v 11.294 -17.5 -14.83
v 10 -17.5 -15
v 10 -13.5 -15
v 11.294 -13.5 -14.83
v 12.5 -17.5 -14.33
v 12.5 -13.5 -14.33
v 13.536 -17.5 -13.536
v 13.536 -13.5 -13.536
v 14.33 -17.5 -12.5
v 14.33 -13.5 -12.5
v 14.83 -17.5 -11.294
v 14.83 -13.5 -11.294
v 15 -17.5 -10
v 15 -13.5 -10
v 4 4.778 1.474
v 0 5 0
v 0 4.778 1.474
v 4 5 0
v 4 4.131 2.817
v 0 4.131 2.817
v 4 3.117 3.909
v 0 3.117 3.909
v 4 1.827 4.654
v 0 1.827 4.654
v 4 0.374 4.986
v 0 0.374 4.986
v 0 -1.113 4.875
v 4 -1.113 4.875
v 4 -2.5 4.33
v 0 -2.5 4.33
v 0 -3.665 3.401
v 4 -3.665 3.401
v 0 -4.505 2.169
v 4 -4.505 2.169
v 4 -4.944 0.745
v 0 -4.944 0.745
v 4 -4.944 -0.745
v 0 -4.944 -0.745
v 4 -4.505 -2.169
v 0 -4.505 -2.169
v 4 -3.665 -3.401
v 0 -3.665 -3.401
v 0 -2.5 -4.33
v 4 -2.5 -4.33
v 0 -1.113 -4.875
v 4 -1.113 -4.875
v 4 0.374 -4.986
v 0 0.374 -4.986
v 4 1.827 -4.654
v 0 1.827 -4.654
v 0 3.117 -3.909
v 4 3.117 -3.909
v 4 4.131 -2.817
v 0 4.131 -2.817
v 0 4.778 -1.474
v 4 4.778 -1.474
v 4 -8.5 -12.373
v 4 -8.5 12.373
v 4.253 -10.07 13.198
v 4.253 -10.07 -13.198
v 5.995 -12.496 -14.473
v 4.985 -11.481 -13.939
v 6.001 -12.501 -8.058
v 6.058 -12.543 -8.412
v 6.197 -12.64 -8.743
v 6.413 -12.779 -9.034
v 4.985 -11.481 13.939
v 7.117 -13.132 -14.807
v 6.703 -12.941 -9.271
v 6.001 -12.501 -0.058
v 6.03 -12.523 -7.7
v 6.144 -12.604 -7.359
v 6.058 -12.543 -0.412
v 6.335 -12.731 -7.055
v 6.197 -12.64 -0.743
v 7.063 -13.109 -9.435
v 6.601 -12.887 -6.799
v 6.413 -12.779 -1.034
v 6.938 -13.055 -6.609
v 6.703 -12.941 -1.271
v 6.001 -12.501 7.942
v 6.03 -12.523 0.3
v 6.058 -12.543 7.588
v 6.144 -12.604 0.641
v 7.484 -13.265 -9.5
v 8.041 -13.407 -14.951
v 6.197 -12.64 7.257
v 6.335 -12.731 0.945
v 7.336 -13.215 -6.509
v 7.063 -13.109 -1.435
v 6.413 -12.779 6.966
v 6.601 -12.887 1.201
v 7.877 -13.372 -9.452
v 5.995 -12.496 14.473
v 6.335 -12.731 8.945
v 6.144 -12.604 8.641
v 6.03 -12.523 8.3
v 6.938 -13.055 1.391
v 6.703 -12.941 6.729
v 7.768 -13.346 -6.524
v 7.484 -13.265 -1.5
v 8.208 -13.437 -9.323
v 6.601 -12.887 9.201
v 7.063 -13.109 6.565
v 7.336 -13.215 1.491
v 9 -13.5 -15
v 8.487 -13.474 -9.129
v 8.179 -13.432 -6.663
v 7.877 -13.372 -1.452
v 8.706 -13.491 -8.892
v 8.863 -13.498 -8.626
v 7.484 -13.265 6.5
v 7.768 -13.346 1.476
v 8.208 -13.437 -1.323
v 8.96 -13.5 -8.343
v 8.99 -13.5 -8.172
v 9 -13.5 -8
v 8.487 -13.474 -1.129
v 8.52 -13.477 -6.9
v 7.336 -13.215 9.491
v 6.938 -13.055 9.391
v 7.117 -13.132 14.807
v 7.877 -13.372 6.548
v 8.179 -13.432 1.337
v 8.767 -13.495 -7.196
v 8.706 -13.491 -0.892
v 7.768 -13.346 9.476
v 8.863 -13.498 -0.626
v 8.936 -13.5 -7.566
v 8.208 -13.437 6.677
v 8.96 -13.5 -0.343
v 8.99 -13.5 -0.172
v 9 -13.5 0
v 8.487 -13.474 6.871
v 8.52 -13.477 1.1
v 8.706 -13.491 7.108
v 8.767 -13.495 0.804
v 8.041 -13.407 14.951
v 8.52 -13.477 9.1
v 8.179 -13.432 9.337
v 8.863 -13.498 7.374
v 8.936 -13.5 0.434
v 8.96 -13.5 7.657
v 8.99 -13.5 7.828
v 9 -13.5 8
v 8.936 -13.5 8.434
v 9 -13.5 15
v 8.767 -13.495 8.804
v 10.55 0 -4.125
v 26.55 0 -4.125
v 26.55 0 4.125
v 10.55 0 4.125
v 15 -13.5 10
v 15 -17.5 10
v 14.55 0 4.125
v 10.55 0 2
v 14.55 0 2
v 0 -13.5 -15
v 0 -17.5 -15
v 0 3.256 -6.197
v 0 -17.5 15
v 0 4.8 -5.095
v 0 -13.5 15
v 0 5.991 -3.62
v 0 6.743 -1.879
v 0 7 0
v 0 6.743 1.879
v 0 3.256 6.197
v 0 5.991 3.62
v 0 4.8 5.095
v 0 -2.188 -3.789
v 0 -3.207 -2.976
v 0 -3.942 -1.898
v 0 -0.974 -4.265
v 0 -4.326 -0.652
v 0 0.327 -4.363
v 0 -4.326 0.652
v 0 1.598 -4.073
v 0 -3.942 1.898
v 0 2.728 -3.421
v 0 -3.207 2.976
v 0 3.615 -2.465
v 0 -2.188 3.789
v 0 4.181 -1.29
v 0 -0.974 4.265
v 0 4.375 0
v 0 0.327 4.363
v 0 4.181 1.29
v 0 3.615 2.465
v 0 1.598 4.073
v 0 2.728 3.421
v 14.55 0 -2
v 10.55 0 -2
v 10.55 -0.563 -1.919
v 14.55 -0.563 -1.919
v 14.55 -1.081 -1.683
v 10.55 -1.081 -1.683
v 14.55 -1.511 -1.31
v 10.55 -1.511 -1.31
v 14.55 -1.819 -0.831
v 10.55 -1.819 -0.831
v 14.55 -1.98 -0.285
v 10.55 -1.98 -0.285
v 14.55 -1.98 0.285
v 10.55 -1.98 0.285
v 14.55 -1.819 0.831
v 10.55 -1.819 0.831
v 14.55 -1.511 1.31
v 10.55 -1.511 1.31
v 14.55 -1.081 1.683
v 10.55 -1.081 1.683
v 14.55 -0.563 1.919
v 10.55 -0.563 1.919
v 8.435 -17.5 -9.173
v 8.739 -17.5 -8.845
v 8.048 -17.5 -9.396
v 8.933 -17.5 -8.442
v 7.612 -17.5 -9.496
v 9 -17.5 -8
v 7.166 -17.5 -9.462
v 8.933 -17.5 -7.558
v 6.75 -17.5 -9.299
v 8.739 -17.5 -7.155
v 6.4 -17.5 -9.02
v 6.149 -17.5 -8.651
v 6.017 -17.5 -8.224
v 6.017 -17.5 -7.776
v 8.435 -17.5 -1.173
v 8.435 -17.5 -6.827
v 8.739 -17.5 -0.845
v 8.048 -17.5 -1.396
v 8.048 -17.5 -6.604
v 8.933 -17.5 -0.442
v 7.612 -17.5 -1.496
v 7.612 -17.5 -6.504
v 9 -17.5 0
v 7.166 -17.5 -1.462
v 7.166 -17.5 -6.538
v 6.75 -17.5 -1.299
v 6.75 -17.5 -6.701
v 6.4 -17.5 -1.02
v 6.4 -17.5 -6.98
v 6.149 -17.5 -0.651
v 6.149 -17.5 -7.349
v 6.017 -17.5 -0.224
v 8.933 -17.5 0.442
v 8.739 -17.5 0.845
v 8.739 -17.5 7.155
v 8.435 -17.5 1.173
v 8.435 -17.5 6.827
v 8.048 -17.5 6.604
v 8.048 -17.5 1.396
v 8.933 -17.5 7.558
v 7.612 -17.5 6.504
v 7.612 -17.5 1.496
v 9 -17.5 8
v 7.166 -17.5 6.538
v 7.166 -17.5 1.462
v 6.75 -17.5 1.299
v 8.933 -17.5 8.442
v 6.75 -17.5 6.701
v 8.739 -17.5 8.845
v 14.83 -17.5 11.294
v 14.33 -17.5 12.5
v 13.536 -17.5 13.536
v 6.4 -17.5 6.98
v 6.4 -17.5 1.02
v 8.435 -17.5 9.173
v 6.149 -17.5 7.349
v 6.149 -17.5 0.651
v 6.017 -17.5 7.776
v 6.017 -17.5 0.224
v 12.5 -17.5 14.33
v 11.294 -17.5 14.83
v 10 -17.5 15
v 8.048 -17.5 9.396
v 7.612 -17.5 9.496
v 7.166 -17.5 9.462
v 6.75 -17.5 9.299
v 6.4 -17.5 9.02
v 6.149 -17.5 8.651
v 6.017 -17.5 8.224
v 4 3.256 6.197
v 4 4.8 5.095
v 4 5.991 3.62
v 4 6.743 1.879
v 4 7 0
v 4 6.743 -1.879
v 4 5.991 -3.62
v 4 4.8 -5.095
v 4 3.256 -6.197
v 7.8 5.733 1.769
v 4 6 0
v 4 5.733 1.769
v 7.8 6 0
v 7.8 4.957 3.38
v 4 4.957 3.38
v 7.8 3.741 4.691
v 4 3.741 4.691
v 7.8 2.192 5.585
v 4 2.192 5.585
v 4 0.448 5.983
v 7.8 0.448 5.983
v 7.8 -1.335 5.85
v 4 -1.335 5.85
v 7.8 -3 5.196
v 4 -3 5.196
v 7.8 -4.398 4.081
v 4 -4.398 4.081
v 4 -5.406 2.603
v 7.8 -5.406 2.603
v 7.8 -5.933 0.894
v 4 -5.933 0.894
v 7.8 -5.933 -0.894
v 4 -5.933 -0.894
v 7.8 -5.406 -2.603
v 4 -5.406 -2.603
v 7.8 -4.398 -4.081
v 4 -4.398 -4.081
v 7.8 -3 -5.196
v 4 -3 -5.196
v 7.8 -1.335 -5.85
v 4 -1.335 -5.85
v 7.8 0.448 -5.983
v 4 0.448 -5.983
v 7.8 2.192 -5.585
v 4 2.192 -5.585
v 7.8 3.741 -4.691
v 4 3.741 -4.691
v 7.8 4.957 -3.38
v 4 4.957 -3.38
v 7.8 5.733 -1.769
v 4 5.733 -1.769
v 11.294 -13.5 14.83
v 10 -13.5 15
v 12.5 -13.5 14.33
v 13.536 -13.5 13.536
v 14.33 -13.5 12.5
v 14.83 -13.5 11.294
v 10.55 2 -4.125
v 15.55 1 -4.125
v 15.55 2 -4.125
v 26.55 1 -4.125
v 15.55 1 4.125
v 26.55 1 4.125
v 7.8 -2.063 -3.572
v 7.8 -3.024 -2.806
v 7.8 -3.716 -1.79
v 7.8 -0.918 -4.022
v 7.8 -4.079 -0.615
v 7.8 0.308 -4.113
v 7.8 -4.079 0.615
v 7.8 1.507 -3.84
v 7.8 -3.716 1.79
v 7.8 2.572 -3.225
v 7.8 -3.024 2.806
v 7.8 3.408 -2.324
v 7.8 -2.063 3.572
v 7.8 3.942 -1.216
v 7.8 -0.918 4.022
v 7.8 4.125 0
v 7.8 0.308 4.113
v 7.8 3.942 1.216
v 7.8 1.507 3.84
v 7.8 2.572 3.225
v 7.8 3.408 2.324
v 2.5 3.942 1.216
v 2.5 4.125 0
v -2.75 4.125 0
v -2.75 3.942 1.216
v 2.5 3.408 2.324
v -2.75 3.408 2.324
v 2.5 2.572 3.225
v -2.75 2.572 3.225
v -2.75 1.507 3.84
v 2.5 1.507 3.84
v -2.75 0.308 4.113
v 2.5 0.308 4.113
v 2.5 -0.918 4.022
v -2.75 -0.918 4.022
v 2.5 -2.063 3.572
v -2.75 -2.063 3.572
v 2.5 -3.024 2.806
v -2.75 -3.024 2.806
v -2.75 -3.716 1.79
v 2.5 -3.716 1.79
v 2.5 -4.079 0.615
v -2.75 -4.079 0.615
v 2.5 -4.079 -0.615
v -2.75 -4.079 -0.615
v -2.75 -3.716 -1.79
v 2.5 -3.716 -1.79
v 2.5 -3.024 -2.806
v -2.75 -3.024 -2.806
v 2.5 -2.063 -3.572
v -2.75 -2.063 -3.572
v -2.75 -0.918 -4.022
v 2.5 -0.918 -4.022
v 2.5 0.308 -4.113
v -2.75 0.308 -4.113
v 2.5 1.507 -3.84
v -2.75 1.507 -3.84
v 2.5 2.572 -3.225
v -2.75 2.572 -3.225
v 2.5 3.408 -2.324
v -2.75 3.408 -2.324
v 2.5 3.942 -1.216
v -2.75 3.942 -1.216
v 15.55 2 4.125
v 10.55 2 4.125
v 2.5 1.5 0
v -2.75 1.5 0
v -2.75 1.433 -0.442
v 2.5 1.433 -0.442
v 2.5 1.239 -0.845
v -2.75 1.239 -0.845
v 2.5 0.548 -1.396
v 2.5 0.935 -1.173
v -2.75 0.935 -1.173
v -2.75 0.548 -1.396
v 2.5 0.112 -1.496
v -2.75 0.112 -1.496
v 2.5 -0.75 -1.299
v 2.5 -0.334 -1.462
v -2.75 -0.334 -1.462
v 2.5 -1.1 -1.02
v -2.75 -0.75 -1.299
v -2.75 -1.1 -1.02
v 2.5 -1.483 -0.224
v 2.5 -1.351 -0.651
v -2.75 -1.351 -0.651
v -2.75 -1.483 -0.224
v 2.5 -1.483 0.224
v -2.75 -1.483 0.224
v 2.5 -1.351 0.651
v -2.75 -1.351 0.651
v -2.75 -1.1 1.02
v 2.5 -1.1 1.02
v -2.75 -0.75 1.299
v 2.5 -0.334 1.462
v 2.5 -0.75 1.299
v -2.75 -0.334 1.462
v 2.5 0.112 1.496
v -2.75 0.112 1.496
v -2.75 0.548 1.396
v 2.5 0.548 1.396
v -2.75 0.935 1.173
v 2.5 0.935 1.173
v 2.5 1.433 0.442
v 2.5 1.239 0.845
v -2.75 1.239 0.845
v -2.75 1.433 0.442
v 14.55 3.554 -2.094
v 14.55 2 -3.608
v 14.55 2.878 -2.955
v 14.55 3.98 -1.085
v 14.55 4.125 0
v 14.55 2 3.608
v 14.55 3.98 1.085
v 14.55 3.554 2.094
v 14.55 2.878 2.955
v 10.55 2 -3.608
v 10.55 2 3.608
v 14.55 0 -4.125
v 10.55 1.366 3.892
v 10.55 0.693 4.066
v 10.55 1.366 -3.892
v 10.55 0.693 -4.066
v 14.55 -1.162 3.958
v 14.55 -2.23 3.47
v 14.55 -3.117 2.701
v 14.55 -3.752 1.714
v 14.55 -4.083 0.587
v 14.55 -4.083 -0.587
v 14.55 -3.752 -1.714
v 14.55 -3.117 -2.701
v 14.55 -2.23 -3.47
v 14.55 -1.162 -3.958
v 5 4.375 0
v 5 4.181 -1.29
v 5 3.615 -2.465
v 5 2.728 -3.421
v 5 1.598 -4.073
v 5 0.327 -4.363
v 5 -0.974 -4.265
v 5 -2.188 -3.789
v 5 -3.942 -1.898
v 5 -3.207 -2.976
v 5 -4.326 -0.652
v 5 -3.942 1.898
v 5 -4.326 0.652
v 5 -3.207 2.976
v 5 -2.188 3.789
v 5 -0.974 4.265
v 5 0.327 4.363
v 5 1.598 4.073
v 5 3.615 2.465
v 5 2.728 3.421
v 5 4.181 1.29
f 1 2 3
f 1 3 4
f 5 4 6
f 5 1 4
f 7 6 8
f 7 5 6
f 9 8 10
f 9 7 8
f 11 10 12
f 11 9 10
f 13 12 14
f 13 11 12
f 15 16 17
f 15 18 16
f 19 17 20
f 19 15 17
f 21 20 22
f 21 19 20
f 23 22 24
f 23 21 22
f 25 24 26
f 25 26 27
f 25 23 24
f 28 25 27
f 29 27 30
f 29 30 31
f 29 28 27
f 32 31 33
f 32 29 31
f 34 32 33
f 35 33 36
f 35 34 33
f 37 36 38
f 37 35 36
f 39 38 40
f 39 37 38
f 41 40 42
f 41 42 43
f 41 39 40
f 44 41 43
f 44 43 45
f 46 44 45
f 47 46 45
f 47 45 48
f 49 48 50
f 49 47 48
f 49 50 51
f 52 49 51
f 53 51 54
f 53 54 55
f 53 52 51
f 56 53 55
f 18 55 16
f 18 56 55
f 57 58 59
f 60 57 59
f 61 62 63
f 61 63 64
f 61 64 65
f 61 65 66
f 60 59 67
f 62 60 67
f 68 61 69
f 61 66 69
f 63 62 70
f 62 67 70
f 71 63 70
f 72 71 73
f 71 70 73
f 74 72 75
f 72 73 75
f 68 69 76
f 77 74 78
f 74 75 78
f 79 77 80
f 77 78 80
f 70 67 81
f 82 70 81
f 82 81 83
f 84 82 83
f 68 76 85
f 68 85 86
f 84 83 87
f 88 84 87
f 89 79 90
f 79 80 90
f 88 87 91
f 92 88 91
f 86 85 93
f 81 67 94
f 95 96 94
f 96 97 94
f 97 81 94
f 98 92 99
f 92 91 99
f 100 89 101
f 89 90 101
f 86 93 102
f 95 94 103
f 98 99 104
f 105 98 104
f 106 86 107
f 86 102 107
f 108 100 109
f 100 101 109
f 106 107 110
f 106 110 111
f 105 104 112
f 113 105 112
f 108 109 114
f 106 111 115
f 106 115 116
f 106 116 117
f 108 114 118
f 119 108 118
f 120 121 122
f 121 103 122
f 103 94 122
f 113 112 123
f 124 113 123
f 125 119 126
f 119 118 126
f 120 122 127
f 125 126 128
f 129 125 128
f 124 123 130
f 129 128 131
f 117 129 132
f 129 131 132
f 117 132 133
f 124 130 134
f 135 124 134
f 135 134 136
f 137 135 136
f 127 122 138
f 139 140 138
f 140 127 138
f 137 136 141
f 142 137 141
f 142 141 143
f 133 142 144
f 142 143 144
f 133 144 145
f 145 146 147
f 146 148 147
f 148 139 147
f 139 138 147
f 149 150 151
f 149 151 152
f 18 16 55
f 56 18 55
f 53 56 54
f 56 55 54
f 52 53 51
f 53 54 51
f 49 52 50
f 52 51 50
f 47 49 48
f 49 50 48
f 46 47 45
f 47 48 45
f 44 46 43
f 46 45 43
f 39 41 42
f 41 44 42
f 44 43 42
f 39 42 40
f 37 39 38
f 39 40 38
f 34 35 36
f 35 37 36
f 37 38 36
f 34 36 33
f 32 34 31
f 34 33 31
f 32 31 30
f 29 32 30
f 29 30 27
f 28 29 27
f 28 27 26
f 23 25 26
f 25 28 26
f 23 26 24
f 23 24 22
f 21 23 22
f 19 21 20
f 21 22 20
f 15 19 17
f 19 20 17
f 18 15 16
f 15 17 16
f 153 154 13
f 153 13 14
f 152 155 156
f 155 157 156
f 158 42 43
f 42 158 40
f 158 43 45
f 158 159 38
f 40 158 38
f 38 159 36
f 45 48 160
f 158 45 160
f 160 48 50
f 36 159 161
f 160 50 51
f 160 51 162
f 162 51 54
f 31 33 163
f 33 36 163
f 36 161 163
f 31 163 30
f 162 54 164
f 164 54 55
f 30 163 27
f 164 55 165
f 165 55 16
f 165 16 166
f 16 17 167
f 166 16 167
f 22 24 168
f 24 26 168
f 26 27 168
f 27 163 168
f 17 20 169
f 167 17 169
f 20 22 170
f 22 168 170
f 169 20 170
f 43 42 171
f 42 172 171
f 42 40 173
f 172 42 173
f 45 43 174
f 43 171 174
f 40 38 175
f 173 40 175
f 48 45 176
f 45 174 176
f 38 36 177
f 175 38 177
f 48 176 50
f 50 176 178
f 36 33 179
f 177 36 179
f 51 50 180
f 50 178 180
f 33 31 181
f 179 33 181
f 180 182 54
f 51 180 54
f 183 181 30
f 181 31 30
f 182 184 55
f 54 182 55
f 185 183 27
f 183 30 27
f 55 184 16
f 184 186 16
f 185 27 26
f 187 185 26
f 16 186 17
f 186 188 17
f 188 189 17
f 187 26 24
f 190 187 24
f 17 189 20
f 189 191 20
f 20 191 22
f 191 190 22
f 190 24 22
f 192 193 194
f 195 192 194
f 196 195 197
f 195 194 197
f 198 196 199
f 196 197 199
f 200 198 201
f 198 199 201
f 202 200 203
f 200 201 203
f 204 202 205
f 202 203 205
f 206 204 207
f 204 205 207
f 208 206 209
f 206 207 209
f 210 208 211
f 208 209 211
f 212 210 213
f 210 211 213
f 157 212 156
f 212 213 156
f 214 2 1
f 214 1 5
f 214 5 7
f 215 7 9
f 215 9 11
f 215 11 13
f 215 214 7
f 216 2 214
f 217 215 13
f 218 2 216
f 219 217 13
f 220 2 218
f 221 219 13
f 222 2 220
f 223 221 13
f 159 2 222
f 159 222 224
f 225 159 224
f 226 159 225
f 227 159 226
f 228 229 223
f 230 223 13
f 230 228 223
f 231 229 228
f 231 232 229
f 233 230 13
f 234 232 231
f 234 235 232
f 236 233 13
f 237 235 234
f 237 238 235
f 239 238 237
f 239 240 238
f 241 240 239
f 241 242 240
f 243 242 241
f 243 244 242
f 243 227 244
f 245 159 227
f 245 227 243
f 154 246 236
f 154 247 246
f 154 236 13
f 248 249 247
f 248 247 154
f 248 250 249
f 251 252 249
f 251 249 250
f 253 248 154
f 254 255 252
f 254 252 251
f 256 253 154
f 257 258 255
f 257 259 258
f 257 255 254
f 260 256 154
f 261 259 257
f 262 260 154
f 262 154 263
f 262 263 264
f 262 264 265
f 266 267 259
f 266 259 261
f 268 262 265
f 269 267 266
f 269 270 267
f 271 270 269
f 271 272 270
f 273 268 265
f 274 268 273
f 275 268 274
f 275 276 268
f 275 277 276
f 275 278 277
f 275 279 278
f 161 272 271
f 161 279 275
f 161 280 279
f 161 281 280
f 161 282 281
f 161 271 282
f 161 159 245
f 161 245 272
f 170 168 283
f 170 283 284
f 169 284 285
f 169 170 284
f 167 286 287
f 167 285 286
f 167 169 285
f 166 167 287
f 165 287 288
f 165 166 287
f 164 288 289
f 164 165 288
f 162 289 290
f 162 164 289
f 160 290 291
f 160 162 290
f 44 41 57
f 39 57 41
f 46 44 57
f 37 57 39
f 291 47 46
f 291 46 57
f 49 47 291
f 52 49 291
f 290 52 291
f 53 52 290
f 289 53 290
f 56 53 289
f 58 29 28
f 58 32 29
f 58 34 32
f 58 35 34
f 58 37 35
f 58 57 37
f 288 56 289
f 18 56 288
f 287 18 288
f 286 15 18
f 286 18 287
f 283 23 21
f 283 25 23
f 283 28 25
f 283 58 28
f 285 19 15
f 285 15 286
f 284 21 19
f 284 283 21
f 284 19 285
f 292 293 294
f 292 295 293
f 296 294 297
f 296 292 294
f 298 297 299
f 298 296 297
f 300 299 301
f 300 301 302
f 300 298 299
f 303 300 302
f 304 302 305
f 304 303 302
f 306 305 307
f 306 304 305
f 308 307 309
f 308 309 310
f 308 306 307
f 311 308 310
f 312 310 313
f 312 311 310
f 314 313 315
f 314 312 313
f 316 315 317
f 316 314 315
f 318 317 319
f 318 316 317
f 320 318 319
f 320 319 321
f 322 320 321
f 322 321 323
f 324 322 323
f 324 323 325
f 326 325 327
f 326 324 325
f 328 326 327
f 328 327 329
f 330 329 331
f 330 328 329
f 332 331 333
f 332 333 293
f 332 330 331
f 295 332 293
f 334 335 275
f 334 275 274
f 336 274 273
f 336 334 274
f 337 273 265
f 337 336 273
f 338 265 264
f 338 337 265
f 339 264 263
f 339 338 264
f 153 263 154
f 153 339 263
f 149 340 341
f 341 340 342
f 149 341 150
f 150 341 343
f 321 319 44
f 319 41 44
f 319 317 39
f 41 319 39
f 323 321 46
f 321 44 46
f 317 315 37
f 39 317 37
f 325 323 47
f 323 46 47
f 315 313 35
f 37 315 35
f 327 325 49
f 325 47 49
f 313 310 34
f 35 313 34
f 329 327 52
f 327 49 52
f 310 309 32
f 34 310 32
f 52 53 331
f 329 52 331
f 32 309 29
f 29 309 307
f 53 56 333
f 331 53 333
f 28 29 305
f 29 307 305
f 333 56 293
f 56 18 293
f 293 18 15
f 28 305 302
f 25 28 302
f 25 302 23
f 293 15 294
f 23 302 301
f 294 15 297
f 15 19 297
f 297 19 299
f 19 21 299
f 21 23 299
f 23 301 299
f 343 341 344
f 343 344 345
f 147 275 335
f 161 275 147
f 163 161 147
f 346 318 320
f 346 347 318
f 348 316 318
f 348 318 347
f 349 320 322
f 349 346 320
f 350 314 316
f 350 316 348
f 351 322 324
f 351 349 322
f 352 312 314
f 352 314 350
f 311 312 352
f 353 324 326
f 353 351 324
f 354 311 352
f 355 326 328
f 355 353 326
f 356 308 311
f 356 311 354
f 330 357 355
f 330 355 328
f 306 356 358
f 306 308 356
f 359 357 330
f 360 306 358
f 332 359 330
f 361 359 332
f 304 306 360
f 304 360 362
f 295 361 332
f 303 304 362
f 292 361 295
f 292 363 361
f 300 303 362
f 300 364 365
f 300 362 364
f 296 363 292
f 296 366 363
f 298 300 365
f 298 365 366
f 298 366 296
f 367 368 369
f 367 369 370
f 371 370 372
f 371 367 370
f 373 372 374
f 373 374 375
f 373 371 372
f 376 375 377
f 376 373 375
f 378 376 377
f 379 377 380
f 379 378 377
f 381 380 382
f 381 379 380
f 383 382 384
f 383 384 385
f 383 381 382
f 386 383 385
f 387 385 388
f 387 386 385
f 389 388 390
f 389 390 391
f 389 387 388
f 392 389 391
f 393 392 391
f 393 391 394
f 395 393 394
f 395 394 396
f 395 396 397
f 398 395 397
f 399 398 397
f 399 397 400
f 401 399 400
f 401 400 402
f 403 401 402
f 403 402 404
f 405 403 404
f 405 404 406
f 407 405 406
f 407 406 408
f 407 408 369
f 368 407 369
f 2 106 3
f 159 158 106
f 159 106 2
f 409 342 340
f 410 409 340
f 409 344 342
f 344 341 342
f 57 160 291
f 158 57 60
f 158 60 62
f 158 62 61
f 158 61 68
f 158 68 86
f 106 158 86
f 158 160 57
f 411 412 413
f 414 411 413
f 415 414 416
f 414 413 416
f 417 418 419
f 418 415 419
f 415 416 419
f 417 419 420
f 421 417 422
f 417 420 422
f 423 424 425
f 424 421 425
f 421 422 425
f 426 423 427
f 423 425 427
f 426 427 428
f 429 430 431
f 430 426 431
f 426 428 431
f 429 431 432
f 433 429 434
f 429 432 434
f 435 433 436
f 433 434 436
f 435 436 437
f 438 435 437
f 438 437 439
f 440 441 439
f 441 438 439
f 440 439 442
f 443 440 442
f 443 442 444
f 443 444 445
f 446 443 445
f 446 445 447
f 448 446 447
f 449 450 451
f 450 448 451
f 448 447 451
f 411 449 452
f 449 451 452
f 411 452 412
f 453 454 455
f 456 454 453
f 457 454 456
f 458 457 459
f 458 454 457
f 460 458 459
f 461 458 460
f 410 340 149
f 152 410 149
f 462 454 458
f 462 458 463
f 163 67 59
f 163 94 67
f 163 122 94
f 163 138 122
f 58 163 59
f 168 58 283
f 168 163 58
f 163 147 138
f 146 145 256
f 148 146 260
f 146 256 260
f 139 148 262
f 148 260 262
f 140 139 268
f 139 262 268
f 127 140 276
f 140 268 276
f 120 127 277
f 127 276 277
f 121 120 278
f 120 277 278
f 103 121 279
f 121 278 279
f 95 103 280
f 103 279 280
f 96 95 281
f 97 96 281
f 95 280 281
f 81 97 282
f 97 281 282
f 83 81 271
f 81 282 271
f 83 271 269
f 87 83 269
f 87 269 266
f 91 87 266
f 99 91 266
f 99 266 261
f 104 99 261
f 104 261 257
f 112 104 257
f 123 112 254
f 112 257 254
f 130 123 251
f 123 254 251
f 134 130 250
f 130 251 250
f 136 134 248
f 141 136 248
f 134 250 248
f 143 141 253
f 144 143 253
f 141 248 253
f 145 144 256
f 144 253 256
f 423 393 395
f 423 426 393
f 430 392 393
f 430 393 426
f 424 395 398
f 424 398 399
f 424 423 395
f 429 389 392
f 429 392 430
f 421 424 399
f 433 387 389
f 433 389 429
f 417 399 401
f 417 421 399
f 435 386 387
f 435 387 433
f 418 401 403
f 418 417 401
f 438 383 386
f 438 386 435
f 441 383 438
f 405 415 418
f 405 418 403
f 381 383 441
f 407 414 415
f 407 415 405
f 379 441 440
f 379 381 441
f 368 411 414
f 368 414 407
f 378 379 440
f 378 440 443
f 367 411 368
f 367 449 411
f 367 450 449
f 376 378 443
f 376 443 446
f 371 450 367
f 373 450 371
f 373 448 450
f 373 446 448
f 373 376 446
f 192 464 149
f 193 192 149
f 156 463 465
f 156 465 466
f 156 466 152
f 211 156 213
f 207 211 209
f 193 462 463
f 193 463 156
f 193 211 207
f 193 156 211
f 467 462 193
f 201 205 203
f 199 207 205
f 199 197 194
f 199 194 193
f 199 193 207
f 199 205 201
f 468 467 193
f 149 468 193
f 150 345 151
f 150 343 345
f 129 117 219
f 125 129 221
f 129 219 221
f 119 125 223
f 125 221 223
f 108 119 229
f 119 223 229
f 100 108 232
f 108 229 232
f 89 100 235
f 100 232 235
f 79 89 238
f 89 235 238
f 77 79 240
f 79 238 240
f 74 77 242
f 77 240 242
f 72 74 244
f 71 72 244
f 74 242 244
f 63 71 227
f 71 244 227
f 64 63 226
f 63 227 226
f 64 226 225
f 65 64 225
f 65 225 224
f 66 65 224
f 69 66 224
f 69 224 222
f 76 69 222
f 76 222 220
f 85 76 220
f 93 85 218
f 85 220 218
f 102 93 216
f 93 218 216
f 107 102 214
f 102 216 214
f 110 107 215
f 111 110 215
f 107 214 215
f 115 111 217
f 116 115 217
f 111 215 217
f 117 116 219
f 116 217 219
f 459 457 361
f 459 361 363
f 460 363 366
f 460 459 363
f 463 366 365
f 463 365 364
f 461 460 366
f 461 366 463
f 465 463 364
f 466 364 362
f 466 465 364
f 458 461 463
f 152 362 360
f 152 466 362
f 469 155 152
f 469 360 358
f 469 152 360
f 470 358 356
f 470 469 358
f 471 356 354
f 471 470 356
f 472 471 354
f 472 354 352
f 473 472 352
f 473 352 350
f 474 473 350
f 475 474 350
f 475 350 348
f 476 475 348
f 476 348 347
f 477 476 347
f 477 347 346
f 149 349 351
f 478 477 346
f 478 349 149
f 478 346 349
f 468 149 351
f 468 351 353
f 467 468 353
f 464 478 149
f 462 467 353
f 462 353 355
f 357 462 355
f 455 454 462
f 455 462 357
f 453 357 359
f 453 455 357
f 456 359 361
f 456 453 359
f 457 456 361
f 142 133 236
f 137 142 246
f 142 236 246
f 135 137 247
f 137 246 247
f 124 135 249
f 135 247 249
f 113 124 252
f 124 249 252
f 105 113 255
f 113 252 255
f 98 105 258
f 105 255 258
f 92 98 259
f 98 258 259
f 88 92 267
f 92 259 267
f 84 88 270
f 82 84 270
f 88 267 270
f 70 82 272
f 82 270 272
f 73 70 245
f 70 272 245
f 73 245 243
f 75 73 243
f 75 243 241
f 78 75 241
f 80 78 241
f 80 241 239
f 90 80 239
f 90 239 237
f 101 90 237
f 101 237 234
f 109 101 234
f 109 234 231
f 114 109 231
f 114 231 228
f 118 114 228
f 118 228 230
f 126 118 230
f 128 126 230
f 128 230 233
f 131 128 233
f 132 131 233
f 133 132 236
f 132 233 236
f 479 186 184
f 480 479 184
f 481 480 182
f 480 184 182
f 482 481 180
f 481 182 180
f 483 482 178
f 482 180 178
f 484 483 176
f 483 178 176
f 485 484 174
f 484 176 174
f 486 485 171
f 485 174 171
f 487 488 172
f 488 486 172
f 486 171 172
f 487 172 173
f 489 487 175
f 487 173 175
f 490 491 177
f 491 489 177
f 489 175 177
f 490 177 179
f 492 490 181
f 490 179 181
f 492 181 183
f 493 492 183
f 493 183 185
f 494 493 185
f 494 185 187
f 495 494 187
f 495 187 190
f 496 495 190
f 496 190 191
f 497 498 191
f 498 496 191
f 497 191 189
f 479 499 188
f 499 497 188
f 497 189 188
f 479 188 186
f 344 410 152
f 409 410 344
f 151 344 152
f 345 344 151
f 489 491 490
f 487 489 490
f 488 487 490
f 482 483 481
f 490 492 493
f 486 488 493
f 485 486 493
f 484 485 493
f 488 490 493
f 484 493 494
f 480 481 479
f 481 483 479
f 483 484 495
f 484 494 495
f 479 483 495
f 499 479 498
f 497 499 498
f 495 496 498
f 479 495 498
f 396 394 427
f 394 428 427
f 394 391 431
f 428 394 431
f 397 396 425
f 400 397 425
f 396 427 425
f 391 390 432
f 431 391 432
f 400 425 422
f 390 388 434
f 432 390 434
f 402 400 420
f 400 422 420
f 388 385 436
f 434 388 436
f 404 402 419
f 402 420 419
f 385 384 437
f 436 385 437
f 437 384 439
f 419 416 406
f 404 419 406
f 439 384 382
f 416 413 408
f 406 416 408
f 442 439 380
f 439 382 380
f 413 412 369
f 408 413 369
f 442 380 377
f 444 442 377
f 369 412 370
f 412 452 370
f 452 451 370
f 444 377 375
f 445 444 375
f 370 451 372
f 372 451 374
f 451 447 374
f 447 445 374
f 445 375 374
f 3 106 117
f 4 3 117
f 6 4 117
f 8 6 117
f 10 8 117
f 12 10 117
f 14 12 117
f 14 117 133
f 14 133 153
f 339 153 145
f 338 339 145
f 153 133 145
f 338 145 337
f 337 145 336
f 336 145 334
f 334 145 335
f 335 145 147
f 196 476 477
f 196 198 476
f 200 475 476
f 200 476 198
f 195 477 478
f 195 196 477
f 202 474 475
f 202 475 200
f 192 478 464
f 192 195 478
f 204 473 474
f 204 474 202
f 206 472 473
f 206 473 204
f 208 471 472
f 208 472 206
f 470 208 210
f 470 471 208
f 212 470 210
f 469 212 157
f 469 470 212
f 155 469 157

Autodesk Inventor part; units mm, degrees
ref_plane "YZ Plane" through (0, 0, 0) normal (1, 0, 0) x (0, 1, 0)
ref_plane "XZ Plane" through (0, 0, 0) normal (0, 1, 0) x (-1, 0, 0)
ref_plane "XY Plane" through (0, 0, 0) normal (0, 0, 1) x (1, 0, 0)
sketch "Sketch1" plane through (0, 0, 0) normal (0, 0, 1) x (1, 0, 0)
  line L0 (0, 5) -> (4, 5)
  line L1 (4, 5) -> (4, 6)
  line L2 (4, 6) -> (7.8, 6)
  line L3 (7.8, 6) -> (7.8, 4.125)
  line L4 (7.8, 4.125) -> (14.55, 4.125)
  line L5 (14.55, 4.125) -> (14.55, 0)
  line L6 (14.55, 0) -> (5, 0)
  line L7 (5, 0) -> (5, 4.375)
  line L8 (5, 4.375) -> (0, 4.375)
  line L9 (0, 4.375) -> (0, 5)
  line L10 (-2.75, 4.125) -> (2.5, 4.125)
  line L11 (2.5, 4.125) -> (2.5, 1.5)
  line L12 (2.5, 1.5) -> (-2.75, 1.5)
  line L13 (-2.75, 1.5) -> (-2.75, 4.125)
  line L14 (10.55, 0) -> (15.55, 0)
  line L15 (15.55, 0) -> (15.55, 2)
  line L16 (15.55, 2) -> (10.55, 2)
  line L17 (10.55, 2) -> (10.55, 0)
  line L18 (15.55, 1) -> (26.55, 1)
  line L19 (26.55, 1) -> (26.55, 0)
  line L20 (26.55, 0) -> (15.55, 0)
  line L21 (15.55, 0) -> (15.55, 1)
  line L22 (-8.61, 0) -> (32.41, 0) projected
  point P0 (0, 0)
  point P1 (2.5, 4.375)
  point P2 (14.55, 2)
  point P3 (14.55, 0)
  dimension "d0" = 6
  dimension "d1" = 5
  dimension "d2" = 1.5
  dimension "d3" = 0.25
  dimension "d5" = 2.75
  dimension "d6" = 5
  dimension "d7" = 4.125
  dimension "d8" = 4
  dimension "d9" = 3.8
  dimension "d10" = 6.75
  dimension "d11" = 4
  dimension "d12" = 2
  dimension "d13" = 5
  dimension "d14" = 11
  dimension "d15" = 4.125
revolve "Revolution1" add sketch "Sketch1" angle 360 about axis through (-10, 0, 0) along (1, 0, 0) contours L0 L1 L2 L3 L4 L5 L16 L17 L6 L7 L8 L9
revolve "Revolution2" add sketch "Sketch1" angle 360 about axis through (-10, 0, 0) along (1, 0, 0) separate body contours L10 L11 L12 L13
extrude "Extrusion1" cut sketch "Sketch1" along normal through all both and the other way through all contours L17 L16 L5 L6
extrude "Extrusion2" add sketch "Sketch1" along normal mid plane 8.25 separate body contours L17 L16 L5 L6 | L5 L16 L15 L14 | L15 L18 L19 L20
sketch "Sketch2" plane through (0, 0, 0) normal (1, 0, 0) x (0, 1, 0)
  circle A0 centre (0, 0) radius 5
  arc A1 (3.2557, -6.1968) -> (3.2557, 6.1968) centre (0, 0) ccw
  line L0 (3.2557, -6.1968) -> (-13.5, -15)
  line L1 (-13.5, -15) -> (-17.5, -15)
  line L2 (-17.5, -15) -> (-17.5, 15)
  line L3 (-17.5, 15) -> (-13.5, 15)
  line L4 (-13.5, 15) -> (3.2557, 6.1968)
  line L5 (-13.5, -15) -> (-13.5, 15)
  line L6 (0, 0) -> (-13.5, 0) construction
  dimension "d22" = 10
  dimension "d23" = 4
  dimension "d24" = 2
  dimension "d25" = 17.5
  dimension "d26" = 30
extrude "Extrusion3" add sketch "Sketch2" along normal blind 4 separate body contours L0 L5 L4 A1
extrude "Extrusion4" add sketch "Sketch2" along normal blind 15 contours L1 L2 L3 L5
sketch "Sketch3" plane through (0, -17.5, -15) normal (0, -1, 0) x (1, 0, 0)
  circle A0 centre (7.5, 23) radius 1.5
  circle A1 centre (7.5, 7) radius 1.5
  circle A2 centre (7.5, 15) radius 1.5
  line L0 (7.5, 7) -> (7.5, 23) construction
  line L1 (0, 30) -> (0, 0) construction
  point P0 (0, 15)
  point P1 (0, 15)
  dimension "d32" = 3
  dimension "d33" = 3
  dimension "d34" = 3
  dimension "d35" = 16
  dimension "d36" = 7.5
fillet "Fillet1" radius 5 1 edges at (4, -13.5, 0)
extrude "Extrusion5" cut sketch "Sketch3" against normal up to surface
fillet "Fillet2" radius 5 2 edges at (15, -15.5, 15) (15, -15.5, -15)
properties part number "Laser"
